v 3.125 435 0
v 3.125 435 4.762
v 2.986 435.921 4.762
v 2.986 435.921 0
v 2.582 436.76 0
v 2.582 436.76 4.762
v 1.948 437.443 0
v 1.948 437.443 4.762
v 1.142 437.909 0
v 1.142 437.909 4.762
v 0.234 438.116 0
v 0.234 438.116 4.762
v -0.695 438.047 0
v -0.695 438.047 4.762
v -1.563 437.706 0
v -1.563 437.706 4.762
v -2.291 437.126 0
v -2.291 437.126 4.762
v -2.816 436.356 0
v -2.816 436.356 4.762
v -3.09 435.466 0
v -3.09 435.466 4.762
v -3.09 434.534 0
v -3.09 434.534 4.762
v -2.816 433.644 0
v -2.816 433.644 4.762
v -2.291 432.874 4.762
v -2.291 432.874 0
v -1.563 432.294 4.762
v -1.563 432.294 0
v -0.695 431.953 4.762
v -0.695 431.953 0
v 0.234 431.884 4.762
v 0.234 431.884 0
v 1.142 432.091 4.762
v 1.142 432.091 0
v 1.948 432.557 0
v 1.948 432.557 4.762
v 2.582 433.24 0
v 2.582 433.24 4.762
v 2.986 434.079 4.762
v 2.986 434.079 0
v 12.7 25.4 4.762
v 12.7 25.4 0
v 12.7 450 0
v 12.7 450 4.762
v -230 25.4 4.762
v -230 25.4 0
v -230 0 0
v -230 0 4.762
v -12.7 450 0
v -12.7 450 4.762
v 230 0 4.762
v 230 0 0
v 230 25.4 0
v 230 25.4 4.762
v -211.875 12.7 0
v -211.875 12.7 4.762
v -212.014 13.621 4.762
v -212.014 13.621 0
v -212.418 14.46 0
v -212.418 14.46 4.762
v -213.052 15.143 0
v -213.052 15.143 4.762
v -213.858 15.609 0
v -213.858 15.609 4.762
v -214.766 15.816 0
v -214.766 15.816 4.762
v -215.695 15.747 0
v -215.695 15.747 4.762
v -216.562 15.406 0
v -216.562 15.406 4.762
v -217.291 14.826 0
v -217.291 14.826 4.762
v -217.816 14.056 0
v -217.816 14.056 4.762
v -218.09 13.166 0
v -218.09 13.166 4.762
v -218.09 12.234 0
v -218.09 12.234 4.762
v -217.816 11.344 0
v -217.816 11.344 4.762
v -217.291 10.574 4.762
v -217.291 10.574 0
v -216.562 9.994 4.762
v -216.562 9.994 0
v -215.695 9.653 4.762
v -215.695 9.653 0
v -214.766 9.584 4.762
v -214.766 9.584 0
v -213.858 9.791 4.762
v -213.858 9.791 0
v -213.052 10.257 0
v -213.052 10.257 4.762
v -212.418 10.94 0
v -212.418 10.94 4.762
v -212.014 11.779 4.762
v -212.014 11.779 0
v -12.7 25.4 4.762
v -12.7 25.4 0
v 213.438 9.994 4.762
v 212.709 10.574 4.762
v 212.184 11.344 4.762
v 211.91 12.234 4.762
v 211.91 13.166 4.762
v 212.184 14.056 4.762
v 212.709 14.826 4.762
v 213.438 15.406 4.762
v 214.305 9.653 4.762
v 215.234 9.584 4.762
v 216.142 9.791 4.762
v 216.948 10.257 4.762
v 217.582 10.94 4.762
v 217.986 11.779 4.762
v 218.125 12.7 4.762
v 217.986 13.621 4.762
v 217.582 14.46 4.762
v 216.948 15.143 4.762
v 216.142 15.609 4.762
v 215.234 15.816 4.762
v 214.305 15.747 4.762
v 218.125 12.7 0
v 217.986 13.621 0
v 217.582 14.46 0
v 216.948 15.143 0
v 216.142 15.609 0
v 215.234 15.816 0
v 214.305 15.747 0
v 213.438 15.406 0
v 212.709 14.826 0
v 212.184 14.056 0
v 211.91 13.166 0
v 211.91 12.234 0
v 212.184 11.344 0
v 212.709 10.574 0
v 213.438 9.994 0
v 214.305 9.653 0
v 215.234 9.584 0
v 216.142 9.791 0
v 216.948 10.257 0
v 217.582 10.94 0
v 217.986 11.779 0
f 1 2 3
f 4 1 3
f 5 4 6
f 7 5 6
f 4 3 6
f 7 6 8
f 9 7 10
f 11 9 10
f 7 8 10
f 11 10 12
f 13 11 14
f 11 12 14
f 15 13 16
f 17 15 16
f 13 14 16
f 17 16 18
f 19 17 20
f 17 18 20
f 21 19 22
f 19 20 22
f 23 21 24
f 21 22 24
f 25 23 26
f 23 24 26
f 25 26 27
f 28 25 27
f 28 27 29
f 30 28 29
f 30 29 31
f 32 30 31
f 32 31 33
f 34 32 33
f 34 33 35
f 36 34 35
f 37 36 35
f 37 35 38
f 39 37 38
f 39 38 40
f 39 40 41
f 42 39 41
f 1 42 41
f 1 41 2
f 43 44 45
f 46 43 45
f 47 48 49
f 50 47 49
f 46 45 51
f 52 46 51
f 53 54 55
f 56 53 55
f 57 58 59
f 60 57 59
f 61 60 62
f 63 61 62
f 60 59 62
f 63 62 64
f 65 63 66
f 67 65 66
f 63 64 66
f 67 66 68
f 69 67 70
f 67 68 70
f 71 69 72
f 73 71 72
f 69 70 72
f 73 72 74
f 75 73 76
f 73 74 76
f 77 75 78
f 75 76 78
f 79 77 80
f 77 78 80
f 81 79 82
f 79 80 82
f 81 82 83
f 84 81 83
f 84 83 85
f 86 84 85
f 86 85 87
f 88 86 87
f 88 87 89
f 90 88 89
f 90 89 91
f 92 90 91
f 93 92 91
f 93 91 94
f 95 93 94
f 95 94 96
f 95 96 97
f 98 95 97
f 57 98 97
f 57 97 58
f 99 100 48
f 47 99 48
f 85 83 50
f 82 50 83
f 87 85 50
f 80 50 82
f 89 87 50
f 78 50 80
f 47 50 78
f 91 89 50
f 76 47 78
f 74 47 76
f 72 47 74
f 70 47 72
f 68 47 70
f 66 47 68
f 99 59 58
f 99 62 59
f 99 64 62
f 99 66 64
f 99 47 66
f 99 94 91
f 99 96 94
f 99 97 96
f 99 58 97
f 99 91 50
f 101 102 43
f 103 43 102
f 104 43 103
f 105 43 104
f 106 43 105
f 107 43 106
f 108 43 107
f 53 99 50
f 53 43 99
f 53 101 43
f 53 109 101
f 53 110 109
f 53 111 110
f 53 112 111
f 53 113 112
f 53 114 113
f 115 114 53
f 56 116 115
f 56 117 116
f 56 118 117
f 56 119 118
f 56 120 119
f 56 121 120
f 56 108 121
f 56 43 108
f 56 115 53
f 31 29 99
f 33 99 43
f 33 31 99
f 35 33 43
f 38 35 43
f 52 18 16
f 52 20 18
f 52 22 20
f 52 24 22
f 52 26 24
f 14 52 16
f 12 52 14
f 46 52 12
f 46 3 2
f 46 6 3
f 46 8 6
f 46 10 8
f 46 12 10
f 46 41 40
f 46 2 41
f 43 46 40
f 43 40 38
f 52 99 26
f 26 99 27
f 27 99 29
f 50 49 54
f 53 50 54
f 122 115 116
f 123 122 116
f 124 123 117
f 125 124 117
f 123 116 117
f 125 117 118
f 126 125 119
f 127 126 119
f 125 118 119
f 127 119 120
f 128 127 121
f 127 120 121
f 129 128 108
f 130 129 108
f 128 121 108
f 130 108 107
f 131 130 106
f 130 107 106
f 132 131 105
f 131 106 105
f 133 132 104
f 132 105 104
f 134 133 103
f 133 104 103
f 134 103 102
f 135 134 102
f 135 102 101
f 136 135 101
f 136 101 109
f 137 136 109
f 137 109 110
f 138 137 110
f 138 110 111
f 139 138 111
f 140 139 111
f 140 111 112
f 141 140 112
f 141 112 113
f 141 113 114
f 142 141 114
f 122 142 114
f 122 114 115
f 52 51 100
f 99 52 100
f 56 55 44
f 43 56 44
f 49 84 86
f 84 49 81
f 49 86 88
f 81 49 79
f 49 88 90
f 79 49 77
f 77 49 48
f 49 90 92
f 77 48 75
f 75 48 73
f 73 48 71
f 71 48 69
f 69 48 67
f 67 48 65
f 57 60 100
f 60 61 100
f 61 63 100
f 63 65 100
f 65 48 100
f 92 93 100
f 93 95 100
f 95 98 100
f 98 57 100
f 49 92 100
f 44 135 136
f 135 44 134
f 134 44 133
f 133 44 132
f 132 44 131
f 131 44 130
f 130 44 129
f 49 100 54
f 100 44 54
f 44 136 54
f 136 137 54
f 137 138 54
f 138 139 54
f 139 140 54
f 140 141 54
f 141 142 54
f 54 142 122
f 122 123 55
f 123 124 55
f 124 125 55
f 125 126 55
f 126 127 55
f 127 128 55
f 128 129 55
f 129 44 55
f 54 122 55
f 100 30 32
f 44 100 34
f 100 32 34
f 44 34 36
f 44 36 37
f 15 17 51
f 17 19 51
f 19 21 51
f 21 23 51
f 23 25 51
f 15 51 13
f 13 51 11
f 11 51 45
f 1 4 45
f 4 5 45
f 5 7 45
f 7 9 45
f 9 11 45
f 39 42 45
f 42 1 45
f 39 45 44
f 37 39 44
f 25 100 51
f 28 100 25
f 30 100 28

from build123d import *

# Parameters (mm, degrees)
EXTRUDE1_DEPTH     = 4.7625
SKETCH2_R          = 3.125
CUT_EXTRUDE1_DEPTH = 5.7625


with BuildPart() as part:
    # Sketch1 → Extrude1 (new body)
    with BuildSketch(Plane.XY):
        Polygon((-230, 0), (230, 0), (230, 25.4), (12.7, 25.4), (12.7, 450), (-12.7, 450), (-12.7, 25.4), (-230, 25.4), align=None)
    extrude(amount=EXTRUDE1_DEPTH)

    # Sketch2 → Cut-Extrude1 (cut, through all)
    with BuildSketch(Plane.XY.offset(4.7625)):
        with Locations((215, 12.7)):
            Circle(SKETCH2_R)
        with Locations((-215, 12.7)):
            Circle(SKETCH2_R)
        with Locations((0, 435)):
            Circle(SKETCH2_R)
    extrude(amount=-CUT_EXTRUDE1_DEPTH, mode=Mode.SUBTRACT)


solid = part.part
